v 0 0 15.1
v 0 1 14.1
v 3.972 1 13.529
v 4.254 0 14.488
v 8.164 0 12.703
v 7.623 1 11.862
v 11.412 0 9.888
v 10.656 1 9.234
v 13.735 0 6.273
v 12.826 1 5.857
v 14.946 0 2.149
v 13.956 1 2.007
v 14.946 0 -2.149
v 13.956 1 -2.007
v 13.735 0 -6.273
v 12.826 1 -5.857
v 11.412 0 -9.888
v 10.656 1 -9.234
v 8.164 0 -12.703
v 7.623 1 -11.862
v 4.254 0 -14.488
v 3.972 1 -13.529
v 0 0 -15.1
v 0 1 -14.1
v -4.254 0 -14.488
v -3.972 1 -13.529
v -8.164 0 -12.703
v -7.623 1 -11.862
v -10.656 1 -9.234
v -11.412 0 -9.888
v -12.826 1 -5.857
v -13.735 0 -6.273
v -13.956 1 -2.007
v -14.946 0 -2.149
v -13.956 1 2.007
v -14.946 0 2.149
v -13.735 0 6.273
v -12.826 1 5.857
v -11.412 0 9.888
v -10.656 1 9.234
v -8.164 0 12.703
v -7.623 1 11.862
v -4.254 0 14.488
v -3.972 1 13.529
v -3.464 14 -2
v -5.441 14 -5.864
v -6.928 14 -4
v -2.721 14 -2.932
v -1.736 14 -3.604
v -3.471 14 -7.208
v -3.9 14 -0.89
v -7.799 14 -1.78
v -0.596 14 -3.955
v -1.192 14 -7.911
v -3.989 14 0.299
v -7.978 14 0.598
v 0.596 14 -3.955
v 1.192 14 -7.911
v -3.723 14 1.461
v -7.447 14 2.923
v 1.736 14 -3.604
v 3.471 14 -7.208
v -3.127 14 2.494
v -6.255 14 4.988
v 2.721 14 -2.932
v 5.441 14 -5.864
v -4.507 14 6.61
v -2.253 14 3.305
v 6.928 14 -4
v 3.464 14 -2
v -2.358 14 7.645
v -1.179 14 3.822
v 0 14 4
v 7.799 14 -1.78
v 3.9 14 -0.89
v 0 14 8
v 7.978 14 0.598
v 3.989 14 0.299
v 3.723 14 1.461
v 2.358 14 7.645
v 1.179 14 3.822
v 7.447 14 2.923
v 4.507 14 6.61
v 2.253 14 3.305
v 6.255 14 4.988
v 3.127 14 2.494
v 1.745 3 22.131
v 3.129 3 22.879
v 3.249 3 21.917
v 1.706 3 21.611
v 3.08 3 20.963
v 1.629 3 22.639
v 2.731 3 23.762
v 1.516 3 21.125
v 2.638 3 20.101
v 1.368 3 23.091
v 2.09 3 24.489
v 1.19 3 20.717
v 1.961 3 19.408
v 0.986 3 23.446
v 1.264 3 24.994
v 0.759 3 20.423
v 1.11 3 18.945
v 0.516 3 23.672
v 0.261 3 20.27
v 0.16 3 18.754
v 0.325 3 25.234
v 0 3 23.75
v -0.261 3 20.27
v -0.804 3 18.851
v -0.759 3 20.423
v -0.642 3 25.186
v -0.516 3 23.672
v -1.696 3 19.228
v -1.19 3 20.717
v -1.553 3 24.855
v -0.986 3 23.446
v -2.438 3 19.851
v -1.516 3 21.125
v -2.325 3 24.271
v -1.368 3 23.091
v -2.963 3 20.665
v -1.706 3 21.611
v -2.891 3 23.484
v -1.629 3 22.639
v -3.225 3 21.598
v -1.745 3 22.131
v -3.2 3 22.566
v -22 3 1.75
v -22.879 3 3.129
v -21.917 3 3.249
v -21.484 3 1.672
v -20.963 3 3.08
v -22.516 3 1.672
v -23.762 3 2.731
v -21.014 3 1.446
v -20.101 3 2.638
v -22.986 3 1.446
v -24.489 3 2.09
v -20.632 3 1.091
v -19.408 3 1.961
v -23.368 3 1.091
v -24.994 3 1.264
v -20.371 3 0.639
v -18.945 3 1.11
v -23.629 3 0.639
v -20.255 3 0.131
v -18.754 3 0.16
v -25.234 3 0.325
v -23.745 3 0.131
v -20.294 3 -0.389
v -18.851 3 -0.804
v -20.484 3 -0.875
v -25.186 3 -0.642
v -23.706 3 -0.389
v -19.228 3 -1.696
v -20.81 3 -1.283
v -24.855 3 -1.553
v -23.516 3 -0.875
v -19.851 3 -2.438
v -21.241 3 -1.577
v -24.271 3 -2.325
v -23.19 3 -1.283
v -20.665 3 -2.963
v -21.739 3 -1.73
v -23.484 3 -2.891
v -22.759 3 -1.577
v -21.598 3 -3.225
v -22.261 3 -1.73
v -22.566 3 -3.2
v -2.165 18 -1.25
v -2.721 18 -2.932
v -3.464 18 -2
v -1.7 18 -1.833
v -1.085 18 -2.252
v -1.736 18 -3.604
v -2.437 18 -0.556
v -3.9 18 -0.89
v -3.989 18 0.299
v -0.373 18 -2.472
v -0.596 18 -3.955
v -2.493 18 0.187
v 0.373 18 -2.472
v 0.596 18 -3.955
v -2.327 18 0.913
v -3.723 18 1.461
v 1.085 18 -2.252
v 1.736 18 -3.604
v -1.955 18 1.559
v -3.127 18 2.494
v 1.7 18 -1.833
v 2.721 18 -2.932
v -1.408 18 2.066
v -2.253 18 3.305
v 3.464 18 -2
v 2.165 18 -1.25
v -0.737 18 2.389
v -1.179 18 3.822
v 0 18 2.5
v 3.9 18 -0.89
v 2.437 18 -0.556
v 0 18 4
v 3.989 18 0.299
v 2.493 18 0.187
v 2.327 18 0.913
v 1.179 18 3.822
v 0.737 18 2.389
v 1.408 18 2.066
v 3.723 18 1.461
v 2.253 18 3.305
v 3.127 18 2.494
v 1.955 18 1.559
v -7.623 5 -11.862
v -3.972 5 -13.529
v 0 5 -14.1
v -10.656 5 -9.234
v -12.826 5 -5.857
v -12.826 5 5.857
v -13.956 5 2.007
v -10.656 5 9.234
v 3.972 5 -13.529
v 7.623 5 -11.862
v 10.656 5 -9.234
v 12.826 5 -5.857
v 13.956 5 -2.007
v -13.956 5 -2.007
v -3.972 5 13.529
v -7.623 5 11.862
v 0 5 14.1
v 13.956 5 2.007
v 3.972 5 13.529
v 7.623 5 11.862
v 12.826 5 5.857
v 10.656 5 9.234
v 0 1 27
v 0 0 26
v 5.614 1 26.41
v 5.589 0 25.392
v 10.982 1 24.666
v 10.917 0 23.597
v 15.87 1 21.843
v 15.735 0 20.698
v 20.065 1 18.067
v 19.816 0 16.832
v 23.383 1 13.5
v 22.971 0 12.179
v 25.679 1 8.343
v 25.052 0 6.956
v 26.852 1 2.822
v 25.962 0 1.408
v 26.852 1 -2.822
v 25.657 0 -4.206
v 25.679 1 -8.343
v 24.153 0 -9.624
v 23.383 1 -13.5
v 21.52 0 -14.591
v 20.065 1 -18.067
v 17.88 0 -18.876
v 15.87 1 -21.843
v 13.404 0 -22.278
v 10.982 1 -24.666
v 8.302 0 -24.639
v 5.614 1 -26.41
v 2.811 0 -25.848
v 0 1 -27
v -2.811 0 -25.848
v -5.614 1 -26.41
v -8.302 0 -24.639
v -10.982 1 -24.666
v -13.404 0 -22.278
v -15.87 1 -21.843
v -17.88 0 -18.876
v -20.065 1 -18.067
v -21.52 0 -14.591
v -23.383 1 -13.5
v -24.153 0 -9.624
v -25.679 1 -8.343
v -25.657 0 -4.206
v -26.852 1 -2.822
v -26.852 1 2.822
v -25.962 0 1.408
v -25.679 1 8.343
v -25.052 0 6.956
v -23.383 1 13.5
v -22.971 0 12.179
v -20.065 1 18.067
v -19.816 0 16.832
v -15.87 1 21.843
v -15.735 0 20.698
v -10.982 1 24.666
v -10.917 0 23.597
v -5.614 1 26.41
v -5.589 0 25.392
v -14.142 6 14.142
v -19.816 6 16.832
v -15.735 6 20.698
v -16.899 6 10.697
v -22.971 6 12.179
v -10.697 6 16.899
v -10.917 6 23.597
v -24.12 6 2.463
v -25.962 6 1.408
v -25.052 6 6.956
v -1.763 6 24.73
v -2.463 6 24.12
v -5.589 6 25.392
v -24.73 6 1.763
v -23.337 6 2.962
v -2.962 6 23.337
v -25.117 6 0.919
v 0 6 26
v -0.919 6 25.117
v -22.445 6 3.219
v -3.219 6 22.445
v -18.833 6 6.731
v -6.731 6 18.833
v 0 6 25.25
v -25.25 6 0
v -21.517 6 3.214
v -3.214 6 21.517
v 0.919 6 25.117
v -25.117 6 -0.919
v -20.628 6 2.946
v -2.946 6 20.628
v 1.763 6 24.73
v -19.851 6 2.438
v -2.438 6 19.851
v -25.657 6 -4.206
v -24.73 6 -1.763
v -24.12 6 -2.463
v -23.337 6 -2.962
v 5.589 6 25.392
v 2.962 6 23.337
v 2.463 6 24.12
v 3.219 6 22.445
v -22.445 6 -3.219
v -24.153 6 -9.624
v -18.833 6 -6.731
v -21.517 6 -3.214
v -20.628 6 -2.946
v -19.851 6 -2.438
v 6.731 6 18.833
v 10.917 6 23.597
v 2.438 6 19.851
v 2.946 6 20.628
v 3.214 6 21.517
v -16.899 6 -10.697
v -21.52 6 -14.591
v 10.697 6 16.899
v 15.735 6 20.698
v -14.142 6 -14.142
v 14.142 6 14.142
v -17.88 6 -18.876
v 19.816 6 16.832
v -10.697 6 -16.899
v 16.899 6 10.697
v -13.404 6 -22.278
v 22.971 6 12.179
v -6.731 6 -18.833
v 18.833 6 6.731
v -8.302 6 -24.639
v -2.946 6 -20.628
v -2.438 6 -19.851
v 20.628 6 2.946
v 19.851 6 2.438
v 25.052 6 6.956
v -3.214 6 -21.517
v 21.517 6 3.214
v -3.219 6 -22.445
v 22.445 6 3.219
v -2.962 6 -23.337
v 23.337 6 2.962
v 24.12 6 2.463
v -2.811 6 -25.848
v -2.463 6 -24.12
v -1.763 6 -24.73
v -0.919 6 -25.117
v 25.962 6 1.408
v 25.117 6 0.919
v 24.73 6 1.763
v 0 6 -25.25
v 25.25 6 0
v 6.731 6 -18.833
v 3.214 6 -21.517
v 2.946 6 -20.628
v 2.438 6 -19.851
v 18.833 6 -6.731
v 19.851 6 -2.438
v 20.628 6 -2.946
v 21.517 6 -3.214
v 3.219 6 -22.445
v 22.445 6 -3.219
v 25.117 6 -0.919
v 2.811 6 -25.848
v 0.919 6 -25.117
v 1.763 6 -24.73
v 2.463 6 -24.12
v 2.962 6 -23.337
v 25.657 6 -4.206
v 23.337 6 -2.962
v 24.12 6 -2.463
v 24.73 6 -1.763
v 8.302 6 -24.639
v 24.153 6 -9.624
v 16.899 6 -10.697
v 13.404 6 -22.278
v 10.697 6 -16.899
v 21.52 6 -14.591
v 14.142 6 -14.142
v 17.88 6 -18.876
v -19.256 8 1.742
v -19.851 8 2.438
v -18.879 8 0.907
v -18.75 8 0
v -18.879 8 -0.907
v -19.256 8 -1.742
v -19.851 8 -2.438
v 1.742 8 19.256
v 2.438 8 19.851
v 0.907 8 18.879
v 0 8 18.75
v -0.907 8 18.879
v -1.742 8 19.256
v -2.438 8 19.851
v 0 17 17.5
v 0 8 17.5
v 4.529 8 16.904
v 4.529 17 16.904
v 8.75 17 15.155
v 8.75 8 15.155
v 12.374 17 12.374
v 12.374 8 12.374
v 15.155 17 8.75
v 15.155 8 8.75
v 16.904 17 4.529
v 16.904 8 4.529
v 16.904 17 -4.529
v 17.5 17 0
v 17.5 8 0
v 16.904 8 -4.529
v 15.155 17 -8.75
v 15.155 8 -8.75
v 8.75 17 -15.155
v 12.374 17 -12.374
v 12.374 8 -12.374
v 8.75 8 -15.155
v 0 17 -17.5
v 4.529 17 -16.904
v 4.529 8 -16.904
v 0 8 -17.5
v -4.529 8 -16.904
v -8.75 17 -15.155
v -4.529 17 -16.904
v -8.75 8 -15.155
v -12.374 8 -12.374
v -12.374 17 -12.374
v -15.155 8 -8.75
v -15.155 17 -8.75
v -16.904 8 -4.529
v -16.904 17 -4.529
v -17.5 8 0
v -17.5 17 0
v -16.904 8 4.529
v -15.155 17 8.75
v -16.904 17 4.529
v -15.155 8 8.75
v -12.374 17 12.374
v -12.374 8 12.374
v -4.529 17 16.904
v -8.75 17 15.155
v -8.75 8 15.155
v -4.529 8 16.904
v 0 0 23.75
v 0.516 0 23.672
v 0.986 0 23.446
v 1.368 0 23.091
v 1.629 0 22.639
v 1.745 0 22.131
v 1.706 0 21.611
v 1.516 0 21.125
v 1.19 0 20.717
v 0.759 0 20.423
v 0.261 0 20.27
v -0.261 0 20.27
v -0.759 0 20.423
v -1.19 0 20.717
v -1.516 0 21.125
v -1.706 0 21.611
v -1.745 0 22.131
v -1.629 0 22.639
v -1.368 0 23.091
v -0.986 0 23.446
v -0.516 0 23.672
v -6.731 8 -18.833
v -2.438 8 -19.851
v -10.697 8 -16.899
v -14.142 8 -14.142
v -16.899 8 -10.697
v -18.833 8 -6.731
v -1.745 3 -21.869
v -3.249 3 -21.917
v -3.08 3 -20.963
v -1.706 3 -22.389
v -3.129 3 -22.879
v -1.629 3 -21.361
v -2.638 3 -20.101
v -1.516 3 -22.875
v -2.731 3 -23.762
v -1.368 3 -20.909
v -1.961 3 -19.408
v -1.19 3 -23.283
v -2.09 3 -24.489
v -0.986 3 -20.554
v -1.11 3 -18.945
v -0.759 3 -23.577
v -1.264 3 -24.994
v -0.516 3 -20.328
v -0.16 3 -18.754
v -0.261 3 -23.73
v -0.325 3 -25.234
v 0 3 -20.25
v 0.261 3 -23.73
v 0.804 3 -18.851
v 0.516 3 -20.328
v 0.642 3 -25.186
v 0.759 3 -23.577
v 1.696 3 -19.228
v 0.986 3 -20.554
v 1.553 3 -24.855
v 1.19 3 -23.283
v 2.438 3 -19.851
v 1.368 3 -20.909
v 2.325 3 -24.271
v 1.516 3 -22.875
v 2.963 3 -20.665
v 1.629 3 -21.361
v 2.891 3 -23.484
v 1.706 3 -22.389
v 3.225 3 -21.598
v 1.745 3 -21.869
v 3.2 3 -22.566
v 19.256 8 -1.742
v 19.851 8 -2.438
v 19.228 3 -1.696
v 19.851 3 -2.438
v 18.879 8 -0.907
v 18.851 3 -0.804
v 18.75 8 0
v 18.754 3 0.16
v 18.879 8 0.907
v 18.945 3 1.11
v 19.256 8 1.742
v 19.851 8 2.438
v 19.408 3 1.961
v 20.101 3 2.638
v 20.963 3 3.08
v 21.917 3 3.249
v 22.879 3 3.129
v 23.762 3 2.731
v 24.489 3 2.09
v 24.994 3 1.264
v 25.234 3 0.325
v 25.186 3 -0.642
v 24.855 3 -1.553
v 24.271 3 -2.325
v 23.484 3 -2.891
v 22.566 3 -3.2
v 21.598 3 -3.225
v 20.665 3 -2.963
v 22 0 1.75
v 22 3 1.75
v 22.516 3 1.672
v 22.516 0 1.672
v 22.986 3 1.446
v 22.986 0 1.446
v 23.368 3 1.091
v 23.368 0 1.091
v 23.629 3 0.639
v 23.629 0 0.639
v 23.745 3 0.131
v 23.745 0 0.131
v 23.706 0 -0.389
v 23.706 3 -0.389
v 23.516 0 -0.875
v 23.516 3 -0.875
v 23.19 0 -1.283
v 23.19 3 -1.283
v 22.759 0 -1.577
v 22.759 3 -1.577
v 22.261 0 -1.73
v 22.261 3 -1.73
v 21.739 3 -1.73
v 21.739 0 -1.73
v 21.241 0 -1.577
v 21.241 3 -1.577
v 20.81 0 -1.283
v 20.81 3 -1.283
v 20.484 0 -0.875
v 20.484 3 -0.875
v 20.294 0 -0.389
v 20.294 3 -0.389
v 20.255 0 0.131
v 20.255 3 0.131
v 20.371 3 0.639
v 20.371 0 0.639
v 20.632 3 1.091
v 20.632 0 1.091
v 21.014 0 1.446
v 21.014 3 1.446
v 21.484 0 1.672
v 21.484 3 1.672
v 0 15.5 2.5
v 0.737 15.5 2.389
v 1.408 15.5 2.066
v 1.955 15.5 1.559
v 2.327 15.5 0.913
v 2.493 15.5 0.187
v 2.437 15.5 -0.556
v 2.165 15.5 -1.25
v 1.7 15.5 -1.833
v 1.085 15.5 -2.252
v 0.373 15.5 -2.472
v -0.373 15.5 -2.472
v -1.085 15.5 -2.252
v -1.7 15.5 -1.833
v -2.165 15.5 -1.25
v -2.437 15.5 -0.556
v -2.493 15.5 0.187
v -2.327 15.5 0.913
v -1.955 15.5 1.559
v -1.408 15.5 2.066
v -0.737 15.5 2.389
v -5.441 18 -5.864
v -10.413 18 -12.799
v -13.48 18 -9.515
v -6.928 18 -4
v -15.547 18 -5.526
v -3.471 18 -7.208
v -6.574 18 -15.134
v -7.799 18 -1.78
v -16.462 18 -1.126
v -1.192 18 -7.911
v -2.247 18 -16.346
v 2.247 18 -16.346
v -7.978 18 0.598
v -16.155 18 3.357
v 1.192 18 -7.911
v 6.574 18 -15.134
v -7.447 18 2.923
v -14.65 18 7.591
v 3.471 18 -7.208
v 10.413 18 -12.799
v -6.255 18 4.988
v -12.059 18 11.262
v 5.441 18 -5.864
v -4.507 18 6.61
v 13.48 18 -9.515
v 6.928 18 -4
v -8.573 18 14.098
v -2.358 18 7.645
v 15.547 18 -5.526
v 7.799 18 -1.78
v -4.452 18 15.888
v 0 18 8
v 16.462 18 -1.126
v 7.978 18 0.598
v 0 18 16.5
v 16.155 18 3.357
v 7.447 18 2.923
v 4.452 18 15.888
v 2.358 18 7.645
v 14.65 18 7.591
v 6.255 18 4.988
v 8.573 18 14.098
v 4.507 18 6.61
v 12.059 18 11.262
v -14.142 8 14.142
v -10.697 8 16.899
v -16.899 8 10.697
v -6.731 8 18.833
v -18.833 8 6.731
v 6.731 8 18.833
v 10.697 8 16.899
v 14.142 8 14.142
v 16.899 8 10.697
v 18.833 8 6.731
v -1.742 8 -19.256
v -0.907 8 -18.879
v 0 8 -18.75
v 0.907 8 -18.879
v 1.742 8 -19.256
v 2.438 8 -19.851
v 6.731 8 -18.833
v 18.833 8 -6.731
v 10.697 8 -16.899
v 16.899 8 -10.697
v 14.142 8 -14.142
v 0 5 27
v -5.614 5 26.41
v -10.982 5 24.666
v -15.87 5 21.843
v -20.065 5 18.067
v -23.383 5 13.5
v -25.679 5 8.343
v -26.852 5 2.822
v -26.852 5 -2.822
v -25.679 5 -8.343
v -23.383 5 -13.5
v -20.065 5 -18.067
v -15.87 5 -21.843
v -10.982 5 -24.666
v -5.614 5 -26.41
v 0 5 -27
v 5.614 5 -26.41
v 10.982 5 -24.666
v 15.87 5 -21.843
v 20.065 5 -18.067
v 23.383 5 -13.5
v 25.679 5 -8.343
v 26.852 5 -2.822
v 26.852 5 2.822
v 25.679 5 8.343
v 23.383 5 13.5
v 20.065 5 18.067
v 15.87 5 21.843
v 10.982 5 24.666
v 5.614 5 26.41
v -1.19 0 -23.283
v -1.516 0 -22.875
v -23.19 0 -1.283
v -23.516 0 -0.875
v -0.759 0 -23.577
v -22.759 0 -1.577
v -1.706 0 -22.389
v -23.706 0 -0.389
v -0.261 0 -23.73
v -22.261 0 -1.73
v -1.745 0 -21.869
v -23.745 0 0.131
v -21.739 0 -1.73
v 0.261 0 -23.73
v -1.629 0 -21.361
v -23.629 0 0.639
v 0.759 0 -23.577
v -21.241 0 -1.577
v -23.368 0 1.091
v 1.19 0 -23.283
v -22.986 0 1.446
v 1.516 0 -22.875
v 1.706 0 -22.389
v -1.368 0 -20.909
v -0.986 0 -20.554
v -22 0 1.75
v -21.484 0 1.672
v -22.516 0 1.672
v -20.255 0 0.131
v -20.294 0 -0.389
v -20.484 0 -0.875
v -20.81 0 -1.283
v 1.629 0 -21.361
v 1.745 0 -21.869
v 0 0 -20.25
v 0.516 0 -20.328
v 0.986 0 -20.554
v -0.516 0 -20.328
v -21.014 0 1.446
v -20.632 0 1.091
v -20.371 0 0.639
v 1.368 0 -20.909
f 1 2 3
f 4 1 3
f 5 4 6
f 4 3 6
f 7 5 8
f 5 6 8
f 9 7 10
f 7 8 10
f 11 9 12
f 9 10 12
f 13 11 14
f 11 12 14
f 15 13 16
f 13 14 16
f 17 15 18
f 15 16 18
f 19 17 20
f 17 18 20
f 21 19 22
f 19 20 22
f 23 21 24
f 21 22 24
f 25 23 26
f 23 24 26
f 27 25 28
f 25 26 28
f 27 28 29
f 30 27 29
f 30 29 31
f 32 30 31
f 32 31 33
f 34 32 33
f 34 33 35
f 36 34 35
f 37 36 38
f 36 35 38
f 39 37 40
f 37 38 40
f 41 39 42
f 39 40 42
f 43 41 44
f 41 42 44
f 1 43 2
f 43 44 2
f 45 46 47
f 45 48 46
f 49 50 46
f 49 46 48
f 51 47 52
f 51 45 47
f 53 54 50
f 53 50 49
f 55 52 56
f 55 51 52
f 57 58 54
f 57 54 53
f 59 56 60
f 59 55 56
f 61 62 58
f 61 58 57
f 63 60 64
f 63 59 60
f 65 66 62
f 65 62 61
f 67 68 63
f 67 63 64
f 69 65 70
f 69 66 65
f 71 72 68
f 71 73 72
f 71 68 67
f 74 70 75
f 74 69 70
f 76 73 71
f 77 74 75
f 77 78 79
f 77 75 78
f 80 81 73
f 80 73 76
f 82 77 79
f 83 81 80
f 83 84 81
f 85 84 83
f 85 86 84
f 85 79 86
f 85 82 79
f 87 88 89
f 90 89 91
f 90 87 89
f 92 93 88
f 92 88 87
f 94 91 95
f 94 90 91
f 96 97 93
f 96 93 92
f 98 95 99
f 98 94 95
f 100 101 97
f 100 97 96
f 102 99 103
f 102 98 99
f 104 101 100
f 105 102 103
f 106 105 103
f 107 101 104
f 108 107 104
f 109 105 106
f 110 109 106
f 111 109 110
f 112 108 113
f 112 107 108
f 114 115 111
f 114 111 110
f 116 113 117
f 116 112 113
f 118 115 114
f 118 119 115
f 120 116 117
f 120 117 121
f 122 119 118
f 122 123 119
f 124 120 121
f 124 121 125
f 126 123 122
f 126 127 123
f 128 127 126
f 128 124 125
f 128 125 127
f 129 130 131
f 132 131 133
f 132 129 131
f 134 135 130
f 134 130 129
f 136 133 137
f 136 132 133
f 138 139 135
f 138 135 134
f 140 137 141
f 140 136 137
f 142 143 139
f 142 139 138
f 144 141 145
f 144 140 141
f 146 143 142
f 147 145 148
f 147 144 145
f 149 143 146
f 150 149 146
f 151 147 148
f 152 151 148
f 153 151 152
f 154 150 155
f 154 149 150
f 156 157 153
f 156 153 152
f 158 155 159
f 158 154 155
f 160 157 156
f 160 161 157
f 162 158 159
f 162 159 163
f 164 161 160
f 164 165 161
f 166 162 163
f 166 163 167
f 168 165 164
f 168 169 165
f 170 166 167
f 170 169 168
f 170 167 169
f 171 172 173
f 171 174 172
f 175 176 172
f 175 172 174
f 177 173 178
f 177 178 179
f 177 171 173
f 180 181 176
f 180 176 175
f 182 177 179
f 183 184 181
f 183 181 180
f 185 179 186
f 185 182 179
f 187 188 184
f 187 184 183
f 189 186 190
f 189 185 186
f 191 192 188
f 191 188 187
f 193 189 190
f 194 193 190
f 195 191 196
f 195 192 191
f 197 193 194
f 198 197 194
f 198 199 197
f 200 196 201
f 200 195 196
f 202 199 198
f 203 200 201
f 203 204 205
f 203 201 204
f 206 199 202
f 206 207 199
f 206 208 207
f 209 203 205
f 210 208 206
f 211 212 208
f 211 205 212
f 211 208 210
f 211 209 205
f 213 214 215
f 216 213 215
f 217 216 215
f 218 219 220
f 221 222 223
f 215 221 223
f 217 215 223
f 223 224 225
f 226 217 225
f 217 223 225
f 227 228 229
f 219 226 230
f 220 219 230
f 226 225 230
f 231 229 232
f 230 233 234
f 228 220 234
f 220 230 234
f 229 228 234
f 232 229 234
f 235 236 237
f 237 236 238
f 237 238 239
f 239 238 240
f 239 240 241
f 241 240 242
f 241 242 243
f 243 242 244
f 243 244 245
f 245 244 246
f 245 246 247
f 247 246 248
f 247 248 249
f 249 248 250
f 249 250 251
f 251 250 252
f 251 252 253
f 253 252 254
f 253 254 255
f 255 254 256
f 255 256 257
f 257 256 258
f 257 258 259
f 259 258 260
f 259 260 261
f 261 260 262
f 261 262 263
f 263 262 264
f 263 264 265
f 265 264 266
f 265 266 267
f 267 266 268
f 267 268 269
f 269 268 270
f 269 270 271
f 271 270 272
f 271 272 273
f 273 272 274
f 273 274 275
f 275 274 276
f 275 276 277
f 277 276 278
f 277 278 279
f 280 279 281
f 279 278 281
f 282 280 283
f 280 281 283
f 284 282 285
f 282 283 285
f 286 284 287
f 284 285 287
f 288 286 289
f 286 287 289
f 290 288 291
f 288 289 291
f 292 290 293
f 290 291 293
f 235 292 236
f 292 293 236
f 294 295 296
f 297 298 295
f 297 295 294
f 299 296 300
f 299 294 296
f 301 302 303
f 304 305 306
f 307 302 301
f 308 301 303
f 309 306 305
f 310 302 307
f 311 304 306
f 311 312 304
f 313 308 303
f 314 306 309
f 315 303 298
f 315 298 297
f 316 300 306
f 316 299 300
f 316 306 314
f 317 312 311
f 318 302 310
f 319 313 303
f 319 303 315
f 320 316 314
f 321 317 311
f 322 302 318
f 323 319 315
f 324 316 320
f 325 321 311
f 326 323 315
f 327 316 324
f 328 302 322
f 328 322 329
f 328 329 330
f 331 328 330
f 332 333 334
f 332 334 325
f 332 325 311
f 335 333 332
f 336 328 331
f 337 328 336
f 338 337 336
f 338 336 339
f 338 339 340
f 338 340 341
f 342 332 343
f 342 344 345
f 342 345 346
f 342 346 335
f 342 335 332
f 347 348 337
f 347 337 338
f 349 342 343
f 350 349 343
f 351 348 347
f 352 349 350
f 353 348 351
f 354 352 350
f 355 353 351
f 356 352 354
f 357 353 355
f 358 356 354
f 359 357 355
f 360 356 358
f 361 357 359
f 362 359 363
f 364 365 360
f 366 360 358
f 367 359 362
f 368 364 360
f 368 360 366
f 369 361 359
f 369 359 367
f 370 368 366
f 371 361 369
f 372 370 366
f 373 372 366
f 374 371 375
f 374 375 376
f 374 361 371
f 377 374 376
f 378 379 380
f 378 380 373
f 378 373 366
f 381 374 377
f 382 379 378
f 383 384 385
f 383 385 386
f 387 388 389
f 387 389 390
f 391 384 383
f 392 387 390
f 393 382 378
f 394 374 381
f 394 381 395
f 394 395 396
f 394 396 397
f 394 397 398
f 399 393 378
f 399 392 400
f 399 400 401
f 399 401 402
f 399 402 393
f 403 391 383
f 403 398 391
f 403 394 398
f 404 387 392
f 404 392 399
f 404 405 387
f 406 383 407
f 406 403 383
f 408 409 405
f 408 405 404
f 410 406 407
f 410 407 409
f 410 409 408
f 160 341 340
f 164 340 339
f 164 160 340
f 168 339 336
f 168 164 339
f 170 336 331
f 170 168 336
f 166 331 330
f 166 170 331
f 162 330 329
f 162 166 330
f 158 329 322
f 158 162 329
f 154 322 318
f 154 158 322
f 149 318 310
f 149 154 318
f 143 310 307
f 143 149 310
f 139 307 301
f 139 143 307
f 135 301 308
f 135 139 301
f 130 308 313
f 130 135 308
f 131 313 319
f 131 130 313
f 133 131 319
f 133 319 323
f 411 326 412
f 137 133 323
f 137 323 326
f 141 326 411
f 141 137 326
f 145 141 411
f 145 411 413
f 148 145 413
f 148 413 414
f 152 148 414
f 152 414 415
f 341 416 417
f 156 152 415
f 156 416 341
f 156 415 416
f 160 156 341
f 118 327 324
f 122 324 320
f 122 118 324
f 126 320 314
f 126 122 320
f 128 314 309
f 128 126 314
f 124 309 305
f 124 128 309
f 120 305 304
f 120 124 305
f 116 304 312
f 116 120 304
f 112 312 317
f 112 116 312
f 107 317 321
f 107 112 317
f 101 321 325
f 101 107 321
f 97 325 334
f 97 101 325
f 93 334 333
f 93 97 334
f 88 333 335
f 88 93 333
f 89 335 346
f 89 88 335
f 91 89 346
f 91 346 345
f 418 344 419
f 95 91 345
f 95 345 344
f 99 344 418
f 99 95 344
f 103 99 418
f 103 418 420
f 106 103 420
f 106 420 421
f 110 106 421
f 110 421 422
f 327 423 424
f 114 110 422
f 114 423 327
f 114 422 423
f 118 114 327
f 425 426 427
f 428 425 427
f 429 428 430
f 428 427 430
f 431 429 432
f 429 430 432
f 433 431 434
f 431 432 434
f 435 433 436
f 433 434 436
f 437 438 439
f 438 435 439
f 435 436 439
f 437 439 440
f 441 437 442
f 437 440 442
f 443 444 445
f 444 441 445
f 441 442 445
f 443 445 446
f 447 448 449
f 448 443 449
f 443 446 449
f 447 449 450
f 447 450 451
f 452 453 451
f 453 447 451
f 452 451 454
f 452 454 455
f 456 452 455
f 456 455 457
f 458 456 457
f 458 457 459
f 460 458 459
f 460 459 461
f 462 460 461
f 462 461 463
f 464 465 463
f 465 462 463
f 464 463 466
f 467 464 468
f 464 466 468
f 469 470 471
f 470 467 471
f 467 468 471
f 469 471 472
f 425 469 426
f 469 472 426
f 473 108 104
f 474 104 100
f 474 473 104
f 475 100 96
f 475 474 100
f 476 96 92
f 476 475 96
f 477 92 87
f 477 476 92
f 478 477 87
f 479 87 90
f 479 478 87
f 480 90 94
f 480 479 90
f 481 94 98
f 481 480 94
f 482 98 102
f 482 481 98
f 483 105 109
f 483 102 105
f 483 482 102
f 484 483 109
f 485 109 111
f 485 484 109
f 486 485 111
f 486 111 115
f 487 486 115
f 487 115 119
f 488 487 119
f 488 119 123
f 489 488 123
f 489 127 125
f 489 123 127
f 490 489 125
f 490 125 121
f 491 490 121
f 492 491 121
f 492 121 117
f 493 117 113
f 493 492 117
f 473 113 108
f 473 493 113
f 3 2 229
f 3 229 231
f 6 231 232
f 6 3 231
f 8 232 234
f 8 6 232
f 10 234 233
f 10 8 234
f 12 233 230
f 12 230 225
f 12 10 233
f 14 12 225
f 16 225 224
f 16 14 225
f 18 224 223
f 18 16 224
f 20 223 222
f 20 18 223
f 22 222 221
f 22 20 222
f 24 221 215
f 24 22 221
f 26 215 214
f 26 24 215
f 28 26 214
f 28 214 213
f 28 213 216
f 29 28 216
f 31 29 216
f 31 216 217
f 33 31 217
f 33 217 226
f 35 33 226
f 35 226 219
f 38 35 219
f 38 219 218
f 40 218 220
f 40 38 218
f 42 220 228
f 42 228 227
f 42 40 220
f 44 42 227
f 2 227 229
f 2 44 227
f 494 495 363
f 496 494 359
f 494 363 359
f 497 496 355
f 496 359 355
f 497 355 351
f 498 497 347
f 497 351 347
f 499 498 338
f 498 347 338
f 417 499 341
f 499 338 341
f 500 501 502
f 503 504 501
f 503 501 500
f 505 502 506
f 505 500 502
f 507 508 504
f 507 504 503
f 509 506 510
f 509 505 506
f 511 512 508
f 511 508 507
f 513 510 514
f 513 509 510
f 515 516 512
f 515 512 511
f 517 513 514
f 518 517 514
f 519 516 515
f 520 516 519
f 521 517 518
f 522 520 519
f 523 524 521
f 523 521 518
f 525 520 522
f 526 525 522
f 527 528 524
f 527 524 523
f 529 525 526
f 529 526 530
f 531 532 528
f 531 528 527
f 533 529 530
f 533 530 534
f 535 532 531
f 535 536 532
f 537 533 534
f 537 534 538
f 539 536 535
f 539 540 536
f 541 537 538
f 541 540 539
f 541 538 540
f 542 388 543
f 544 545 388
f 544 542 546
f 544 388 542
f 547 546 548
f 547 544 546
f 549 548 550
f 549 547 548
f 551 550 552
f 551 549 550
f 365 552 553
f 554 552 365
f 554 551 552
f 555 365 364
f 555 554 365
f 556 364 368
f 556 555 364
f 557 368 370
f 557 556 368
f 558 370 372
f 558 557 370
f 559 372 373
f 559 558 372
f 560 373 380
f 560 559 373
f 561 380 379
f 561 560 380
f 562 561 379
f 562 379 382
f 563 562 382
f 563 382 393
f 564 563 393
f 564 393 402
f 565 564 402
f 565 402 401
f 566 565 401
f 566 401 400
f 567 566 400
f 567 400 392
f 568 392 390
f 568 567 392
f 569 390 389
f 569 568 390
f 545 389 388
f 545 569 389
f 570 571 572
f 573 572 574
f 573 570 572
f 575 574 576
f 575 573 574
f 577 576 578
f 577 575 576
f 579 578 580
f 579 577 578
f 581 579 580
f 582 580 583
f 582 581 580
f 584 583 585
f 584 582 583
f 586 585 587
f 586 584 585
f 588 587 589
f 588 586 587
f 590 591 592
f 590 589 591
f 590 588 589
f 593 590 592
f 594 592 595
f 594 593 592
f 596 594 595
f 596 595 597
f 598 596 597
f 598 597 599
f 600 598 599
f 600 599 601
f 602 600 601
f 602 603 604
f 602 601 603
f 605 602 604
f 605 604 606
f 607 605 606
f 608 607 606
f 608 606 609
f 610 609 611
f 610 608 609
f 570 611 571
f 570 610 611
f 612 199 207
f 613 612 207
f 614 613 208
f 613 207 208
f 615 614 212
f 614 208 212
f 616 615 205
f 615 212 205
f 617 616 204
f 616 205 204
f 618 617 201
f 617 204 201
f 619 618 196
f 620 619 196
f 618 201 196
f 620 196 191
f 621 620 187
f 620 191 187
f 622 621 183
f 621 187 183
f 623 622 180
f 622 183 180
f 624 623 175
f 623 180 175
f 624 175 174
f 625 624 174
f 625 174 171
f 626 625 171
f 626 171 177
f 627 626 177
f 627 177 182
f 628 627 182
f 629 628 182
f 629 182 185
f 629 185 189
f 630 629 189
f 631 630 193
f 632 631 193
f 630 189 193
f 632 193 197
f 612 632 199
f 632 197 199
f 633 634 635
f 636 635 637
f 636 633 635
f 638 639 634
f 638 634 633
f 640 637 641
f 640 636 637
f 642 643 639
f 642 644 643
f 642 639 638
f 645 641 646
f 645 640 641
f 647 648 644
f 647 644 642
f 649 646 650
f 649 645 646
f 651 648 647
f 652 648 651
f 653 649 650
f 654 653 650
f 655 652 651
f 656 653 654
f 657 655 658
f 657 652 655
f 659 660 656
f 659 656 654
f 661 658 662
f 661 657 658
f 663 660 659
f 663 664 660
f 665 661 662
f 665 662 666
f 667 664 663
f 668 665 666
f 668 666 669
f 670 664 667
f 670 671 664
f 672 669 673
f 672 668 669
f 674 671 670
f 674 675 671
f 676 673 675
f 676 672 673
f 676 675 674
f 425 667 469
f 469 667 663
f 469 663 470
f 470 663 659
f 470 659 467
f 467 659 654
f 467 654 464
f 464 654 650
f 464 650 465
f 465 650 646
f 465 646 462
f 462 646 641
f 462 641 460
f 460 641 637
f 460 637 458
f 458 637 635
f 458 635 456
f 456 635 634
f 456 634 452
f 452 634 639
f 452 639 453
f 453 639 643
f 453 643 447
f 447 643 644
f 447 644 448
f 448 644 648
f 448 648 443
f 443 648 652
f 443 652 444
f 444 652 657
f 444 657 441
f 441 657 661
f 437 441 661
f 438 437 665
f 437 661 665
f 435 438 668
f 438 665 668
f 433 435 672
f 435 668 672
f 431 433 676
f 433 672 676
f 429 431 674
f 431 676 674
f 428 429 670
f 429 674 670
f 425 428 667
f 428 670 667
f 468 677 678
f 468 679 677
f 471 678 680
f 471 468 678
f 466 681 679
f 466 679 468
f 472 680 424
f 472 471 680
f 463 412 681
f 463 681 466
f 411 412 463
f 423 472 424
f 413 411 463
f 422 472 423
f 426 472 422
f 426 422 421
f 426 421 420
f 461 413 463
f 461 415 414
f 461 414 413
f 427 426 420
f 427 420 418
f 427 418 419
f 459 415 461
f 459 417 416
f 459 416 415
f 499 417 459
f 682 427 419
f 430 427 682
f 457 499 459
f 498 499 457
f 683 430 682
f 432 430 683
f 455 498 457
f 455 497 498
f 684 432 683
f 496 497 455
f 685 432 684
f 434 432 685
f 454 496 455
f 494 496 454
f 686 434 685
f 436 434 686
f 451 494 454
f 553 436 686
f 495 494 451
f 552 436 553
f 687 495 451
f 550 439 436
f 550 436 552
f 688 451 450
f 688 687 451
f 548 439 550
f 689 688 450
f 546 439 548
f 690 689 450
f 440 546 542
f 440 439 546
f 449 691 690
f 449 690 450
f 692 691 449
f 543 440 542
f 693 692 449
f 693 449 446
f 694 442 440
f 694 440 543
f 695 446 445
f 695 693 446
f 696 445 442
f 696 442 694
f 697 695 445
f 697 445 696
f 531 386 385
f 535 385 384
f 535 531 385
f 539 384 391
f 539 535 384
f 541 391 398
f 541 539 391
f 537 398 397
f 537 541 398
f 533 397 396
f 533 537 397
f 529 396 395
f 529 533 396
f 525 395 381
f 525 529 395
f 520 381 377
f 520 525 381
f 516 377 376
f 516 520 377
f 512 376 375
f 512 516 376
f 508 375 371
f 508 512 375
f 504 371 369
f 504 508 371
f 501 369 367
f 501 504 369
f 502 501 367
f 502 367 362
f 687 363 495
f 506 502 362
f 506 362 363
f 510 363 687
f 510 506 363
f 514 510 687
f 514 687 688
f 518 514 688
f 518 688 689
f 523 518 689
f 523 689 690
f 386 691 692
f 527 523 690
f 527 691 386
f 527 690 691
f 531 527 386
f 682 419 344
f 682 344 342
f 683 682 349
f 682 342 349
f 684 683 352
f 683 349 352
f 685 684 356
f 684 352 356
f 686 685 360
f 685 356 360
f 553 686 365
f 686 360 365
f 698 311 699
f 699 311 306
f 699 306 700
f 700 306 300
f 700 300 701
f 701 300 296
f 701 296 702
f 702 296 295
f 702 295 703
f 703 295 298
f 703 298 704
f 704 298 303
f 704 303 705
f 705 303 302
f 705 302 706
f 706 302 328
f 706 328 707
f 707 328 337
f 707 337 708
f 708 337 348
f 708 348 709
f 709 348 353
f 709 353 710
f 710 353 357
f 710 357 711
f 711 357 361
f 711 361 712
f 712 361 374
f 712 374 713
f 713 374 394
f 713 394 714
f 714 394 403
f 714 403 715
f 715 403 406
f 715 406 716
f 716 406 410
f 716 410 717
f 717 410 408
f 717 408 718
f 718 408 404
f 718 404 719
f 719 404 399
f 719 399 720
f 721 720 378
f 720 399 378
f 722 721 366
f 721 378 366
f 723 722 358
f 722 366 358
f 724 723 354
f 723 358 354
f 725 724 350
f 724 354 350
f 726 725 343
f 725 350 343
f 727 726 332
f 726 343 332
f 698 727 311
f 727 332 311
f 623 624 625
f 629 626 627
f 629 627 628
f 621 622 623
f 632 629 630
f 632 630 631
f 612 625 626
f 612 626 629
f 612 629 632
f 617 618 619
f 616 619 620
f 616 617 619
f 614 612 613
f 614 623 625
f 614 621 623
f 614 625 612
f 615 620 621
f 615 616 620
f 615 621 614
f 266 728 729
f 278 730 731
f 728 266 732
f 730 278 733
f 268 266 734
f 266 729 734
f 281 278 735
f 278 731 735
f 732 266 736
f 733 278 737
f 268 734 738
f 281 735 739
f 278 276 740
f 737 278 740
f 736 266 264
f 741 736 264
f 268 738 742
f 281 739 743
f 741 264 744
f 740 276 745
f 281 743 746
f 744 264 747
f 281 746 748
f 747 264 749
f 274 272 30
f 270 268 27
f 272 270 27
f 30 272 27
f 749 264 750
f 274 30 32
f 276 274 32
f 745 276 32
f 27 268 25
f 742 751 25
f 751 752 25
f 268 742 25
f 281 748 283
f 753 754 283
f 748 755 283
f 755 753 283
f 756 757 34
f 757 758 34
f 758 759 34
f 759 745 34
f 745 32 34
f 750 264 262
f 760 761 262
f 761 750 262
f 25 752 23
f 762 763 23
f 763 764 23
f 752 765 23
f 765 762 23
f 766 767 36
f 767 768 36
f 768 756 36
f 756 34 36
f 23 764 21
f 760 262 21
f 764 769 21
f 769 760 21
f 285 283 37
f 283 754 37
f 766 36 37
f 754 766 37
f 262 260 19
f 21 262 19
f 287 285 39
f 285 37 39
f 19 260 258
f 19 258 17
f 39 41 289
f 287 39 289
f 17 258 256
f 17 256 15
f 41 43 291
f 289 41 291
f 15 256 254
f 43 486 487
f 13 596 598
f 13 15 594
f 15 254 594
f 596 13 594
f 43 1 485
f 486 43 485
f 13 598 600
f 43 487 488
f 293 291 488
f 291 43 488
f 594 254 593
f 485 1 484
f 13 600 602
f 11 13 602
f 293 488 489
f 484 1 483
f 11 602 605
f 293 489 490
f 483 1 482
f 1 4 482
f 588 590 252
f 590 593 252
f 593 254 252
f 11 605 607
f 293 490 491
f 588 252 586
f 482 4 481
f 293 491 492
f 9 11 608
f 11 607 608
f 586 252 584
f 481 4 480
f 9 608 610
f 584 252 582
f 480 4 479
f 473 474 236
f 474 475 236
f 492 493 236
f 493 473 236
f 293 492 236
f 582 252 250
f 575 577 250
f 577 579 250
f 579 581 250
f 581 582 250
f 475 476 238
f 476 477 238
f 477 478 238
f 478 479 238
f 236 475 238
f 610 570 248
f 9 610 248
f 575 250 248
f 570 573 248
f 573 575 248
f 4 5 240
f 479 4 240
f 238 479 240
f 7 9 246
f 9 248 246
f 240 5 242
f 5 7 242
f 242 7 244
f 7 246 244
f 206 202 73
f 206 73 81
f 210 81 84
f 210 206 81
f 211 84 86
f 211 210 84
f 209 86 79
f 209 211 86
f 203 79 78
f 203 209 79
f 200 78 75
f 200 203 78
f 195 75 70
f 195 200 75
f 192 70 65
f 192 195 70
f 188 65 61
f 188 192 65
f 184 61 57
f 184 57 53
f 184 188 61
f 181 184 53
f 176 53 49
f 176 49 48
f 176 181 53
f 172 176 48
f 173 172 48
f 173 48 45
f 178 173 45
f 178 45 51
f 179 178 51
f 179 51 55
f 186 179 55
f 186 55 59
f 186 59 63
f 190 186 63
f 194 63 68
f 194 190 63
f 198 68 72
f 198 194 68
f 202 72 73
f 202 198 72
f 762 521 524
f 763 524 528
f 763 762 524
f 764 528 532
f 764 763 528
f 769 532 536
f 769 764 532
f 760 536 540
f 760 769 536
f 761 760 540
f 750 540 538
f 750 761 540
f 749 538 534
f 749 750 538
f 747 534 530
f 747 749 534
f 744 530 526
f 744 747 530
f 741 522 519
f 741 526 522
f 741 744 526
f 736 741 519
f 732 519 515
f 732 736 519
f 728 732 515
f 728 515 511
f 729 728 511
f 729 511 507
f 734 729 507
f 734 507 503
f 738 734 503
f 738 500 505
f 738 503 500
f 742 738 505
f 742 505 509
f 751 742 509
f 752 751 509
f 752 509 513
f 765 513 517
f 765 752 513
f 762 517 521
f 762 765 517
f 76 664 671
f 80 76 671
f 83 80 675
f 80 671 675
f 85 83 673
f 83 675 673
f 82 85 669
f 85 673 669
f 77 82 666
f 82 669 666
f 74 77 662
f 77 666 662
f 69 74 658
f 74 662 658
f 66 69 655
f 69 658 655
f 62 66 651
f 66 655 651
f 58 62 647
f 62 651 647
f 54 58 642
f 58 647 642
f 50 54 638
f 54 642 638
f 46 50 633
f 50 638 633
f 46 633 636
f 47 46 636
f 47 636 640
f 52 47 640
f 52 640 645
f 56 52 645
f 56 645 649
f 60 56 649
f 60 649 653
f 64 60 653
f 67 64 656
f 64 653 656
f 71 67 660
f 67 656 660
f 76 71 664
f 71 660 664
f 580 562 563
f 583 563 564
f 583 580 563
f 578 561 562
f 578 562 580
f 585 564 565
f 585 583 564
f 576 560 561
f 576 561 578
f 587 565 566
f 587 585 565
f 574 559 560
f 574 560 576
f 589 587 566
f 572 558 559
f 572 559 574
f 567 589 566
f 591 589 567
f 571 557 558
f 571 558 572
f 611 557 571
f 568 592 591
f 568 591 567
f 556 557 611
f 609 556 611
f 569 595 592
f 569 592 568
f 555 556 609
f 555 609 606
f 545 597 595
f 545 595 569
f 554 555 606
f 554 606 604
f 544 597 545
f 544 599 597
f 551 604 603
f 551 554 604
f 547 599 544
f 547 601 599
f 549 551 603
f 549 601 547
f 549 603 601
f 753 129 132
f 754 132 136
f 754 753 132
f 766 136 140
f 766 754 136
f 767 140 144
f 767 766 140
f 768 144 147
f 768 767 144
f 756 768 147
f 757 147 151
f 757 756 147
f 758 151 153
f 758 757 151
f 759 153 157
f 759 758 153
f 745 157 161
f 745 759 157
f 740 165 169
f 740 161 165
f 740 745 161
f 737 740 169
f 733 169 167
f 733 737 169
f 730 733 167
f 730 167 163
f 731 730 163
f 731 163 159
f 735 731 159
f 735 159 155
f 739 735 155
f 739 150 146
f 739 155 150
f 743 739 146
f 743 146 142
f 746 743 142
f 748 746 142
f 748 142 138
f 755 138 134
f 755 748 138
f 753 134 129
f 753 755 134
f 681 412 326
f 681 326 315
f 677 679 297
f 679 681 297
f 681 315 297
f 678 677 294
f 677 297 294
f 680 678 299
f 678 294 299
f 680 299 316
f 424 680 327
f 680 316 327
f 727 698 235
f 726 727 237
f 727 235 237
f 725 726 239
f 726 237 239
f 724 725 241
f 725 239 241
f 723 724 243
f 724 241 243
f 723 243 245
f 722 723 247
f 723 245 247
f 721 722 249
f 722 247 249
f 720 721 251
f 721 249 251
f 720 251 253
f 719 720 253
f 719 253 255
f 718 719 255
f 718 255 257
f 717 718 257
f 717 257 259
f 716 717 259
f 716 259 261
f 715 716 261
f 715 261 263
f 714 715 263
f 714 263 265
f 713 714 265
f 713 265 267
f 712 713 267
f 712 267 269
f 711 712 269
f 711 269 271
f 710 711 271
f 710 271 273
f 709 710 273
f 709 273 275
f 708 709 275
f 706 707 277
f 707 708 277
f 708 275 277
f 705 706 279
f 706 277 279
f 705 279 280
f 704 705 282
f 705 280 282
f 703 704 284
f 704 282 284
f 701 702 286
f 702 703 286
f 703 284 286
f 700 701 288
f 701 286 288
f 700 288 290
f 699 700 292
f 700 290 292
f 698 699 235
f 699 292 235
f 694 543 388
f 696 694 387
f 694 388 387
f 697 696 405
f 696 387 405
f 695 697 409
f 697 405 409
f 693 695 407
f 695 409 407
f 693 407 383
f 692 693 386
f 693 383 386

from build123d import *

# Parameters (mm, degrees)
SKETCH_2_R          = 27
EXTRUDE_1_DEPTH     = 18
SKETCH_5_R          = 14.1
CUT_EXTRUDE_1_DEPTH = 5
CUT_EXTRUDE_START   = 6
SKETCH_6_R          = 43.385104725
SKETCH_6_R_2        = 20
CUT_EXTRUDE_2_DEPTH = 37.213741838
CUT_EXTRUDE_START_2 = 8
SKETCH_7_R          = 38.171237221
SKETCH_7_R_2        = 17.5
CUT_EXTRUDE_3_DEPTH = 35.213741838
SKETCH_8_R          = 1.75
CUT_EXTRUDE_4_DEPTH = 43.213741838
CUT_EXTRUDE_START_3 = 3
SKETCH_9_R          = 3.25
CUT_EXTRUDE_5_DEPTH = 40.213741838
CHAMFER1_SIZE       = 1
CHAMFER2_SIZE       = 1
CHAMFER3_SIZE       = 1
CHAMFER4_SIZE       = 1
SKETCH_10_R         = 2.5
CUT_EXTRUDE_6_DEPTH = 2.5
SKETCH_11_R         = 8
SKETCH_11_R_2       = 4
CUT_EXTRUDE_7_DEPTH = 4


with BuildPart() as part:
    # Эскиз2 → Бобышка-Вытянуть1 (new body)
    with BuildSketch(Plane(origin=(0, 0, 0), x_dir=(1, 0, 0), z_dir=(0, 1, 0))):
        with Locations(Location((0, 0, 0), (0, 0, 270))):
            Circle(SKETCH_2_R)
    extrude(amount=EXTRUDE_1_DEPTH)

    # Эскиз5 → Вырез-Вытянуть1 (cut)
    with BuildSketch(Plane(origin=(0, 0, 0), x_dir=(1, 0, 0), z_dir=(0, 1, 0))):
        with Locations(Location((0, 0, 0), (0, 0, 270))):
            Circle(SKETCH_5_R)
    extrude(amount=CUT_EXTRUDE_1_DEPTH, mode=Mode.SUBTRACT)

    # Эскиз6 → Вырез-Вытянуть2 (cut, through all)
    with BuildSketch(Plane(origin=(0, 0, 0), x_dir=(1, 0, 0), z_dir=(0, 1, 0)).offset(CUT_EXTRUDE_START)):
        Circle(SKETCH_6_R)
        with Locations(Location((0, 0, 0), (0, 0, 270))):
            Circle(SKETCH_6_R_2, mode=Mode.SUBTRACT)
    extrude(amount=CUT_EXTRUDE_2_DEPTH, mode=Mode.SUBTRACT)

    # Эскиз7 → Вырез-Вытянуть3 (cut, through all)
    with BuildSketch(Plane(origin=(0, 0, 0), x_dir=(1, 0, 0), z_dir=(0, 1, 0)).offset(CUT_EXTRUDE_START_2)):
        Circle(SKETCH_7_R)
        with Locations(Location((0, 0, 0), (0, 0, 270))):
            Circle(SKETCH_7_R_2, mode=Mode.SUBTRACT)
    extrude(amount=CUT_EXTRUDE_3_DEPTH, mode=Mode.SUBTRACT)

    # Эскиз8 → Вырез-Вытянуть4 (cut, through all)
    with BuildSketch(Plane(origin=(0, 0, 0), x_dir=(1, 0, 0), z_dir=(0, 1, 0))):
        with Locations(Location((0, 22, 0), (0, 0, 270))):
            Circle(SKETCH_8_R)
        with Locations(Location((22, 0, 0), (0, 0, 270))):
            Circle(SKETCH_8_R)
        with Locations(Location((0, -22, 0), (0, 0, 270))):
            Circle(SKETCH_8_R)
        with Locations(Location((-22, 0, 0), (0, 0, 270))):
            Circle(SKETCH_8_R)
    extrude(amount=CUT_EXTRUDE_4_DEPTH, mode=Mode.SUBTRACT)

    # Эскиз9 → Вырез-Вытянуть5 (cut, through all)
    with BuildSketch(Plane(origin=(0, 0, 0), x_dir=(1, 0, 0), z_dir=(0, 1, 0)).offset(CUT_EXTRUDE_START_3)):
        with Locations(Location((0, 22, 0), (0, 0, 318.602722353))):
            Circle(SKETCH_9_R)
        with Locations(Location((22, 0, 0), (0, 0, 131.397277647))):
            Circle(SKETCH_9_R)
        with Locations(Location((0, -22, 0), (0, 0, 138.602722353))):
            Circle(SKETCH_9_R)
        with Locations(Location((-22, 0, 0), (0, 0, 48.602722353))):
            Circle(SKETCH_9_R)
    extrude(amount=CUT_EXTRUDE_5_DEPTH, mode=Mode.SUBTRACT)

    # Chamfer1
    chamfer1_edges = [part.edges().sort_by_distance(p)[0] for p in [
        (0, 0, -14.1),
    ]]
    chamfer(chamfer1_edges, length=CHAMFER1_SIZE)

    # Chamfer2
    chamfer2_edges = [part.edges().sort_by_distance(p)[0] for p in [
        (0, 18, -17.5),
    ]]
    chamfer(chamfer2_edges, length=CHAMFER2_SIZE)

    # Chamfer3
    chamfer3_edges = [part.edges().sort_by_distance(p)[0] for p in [
        (0, 0, -27),
    ]]
    chamfer(chamfer3_edges, length=CHAMFER3_SIZE)

    # Chamfer4
    chamfer4_edges = [part.edges().sort_by_distance(p)[0] for p in [
        (0, 6, -27),
    ]]
    chamfer(chamfer4_edges, length=CHAMFER4_SIZE)

    # Эскиз10 → Вырез-Вытянуть6 (cut)
    with BuildSketch(Plane(origin=(0, 18, 0), x_dir=(1, 0, 0), z_dir=(0, 1, 0))):
        with Locations(Location((0, 0, 0), (0, 0, 270))):
            Circle(SKETCH_10_R)
    extrude(amount=-CUT_EXTRUDE_6_DEPTH, mode=Mode.SUBTRACT)

    # Эскиз11 → Вырез-Вытянуть7 (cut)
    with BuildSketch(Plane(origin=(0, 18, 0), x_dir=(1, 0, 0), z_dir=(0, 1, 0))):
        with Locations(Location((0, 0, 0), (0, 0, 270))):
            Circle(SKETCH_11_R)
        with Locations(Location((0, 0, 0), (0, 0, 270))):
            Circle(SKETCH_11_R_2, mode=Mode.SUBTRACT)
    extrude(amount=-CUT_EXTRUDE_7_DEPTH, mode=Mode.SUBTRACT)


solid = part.part
